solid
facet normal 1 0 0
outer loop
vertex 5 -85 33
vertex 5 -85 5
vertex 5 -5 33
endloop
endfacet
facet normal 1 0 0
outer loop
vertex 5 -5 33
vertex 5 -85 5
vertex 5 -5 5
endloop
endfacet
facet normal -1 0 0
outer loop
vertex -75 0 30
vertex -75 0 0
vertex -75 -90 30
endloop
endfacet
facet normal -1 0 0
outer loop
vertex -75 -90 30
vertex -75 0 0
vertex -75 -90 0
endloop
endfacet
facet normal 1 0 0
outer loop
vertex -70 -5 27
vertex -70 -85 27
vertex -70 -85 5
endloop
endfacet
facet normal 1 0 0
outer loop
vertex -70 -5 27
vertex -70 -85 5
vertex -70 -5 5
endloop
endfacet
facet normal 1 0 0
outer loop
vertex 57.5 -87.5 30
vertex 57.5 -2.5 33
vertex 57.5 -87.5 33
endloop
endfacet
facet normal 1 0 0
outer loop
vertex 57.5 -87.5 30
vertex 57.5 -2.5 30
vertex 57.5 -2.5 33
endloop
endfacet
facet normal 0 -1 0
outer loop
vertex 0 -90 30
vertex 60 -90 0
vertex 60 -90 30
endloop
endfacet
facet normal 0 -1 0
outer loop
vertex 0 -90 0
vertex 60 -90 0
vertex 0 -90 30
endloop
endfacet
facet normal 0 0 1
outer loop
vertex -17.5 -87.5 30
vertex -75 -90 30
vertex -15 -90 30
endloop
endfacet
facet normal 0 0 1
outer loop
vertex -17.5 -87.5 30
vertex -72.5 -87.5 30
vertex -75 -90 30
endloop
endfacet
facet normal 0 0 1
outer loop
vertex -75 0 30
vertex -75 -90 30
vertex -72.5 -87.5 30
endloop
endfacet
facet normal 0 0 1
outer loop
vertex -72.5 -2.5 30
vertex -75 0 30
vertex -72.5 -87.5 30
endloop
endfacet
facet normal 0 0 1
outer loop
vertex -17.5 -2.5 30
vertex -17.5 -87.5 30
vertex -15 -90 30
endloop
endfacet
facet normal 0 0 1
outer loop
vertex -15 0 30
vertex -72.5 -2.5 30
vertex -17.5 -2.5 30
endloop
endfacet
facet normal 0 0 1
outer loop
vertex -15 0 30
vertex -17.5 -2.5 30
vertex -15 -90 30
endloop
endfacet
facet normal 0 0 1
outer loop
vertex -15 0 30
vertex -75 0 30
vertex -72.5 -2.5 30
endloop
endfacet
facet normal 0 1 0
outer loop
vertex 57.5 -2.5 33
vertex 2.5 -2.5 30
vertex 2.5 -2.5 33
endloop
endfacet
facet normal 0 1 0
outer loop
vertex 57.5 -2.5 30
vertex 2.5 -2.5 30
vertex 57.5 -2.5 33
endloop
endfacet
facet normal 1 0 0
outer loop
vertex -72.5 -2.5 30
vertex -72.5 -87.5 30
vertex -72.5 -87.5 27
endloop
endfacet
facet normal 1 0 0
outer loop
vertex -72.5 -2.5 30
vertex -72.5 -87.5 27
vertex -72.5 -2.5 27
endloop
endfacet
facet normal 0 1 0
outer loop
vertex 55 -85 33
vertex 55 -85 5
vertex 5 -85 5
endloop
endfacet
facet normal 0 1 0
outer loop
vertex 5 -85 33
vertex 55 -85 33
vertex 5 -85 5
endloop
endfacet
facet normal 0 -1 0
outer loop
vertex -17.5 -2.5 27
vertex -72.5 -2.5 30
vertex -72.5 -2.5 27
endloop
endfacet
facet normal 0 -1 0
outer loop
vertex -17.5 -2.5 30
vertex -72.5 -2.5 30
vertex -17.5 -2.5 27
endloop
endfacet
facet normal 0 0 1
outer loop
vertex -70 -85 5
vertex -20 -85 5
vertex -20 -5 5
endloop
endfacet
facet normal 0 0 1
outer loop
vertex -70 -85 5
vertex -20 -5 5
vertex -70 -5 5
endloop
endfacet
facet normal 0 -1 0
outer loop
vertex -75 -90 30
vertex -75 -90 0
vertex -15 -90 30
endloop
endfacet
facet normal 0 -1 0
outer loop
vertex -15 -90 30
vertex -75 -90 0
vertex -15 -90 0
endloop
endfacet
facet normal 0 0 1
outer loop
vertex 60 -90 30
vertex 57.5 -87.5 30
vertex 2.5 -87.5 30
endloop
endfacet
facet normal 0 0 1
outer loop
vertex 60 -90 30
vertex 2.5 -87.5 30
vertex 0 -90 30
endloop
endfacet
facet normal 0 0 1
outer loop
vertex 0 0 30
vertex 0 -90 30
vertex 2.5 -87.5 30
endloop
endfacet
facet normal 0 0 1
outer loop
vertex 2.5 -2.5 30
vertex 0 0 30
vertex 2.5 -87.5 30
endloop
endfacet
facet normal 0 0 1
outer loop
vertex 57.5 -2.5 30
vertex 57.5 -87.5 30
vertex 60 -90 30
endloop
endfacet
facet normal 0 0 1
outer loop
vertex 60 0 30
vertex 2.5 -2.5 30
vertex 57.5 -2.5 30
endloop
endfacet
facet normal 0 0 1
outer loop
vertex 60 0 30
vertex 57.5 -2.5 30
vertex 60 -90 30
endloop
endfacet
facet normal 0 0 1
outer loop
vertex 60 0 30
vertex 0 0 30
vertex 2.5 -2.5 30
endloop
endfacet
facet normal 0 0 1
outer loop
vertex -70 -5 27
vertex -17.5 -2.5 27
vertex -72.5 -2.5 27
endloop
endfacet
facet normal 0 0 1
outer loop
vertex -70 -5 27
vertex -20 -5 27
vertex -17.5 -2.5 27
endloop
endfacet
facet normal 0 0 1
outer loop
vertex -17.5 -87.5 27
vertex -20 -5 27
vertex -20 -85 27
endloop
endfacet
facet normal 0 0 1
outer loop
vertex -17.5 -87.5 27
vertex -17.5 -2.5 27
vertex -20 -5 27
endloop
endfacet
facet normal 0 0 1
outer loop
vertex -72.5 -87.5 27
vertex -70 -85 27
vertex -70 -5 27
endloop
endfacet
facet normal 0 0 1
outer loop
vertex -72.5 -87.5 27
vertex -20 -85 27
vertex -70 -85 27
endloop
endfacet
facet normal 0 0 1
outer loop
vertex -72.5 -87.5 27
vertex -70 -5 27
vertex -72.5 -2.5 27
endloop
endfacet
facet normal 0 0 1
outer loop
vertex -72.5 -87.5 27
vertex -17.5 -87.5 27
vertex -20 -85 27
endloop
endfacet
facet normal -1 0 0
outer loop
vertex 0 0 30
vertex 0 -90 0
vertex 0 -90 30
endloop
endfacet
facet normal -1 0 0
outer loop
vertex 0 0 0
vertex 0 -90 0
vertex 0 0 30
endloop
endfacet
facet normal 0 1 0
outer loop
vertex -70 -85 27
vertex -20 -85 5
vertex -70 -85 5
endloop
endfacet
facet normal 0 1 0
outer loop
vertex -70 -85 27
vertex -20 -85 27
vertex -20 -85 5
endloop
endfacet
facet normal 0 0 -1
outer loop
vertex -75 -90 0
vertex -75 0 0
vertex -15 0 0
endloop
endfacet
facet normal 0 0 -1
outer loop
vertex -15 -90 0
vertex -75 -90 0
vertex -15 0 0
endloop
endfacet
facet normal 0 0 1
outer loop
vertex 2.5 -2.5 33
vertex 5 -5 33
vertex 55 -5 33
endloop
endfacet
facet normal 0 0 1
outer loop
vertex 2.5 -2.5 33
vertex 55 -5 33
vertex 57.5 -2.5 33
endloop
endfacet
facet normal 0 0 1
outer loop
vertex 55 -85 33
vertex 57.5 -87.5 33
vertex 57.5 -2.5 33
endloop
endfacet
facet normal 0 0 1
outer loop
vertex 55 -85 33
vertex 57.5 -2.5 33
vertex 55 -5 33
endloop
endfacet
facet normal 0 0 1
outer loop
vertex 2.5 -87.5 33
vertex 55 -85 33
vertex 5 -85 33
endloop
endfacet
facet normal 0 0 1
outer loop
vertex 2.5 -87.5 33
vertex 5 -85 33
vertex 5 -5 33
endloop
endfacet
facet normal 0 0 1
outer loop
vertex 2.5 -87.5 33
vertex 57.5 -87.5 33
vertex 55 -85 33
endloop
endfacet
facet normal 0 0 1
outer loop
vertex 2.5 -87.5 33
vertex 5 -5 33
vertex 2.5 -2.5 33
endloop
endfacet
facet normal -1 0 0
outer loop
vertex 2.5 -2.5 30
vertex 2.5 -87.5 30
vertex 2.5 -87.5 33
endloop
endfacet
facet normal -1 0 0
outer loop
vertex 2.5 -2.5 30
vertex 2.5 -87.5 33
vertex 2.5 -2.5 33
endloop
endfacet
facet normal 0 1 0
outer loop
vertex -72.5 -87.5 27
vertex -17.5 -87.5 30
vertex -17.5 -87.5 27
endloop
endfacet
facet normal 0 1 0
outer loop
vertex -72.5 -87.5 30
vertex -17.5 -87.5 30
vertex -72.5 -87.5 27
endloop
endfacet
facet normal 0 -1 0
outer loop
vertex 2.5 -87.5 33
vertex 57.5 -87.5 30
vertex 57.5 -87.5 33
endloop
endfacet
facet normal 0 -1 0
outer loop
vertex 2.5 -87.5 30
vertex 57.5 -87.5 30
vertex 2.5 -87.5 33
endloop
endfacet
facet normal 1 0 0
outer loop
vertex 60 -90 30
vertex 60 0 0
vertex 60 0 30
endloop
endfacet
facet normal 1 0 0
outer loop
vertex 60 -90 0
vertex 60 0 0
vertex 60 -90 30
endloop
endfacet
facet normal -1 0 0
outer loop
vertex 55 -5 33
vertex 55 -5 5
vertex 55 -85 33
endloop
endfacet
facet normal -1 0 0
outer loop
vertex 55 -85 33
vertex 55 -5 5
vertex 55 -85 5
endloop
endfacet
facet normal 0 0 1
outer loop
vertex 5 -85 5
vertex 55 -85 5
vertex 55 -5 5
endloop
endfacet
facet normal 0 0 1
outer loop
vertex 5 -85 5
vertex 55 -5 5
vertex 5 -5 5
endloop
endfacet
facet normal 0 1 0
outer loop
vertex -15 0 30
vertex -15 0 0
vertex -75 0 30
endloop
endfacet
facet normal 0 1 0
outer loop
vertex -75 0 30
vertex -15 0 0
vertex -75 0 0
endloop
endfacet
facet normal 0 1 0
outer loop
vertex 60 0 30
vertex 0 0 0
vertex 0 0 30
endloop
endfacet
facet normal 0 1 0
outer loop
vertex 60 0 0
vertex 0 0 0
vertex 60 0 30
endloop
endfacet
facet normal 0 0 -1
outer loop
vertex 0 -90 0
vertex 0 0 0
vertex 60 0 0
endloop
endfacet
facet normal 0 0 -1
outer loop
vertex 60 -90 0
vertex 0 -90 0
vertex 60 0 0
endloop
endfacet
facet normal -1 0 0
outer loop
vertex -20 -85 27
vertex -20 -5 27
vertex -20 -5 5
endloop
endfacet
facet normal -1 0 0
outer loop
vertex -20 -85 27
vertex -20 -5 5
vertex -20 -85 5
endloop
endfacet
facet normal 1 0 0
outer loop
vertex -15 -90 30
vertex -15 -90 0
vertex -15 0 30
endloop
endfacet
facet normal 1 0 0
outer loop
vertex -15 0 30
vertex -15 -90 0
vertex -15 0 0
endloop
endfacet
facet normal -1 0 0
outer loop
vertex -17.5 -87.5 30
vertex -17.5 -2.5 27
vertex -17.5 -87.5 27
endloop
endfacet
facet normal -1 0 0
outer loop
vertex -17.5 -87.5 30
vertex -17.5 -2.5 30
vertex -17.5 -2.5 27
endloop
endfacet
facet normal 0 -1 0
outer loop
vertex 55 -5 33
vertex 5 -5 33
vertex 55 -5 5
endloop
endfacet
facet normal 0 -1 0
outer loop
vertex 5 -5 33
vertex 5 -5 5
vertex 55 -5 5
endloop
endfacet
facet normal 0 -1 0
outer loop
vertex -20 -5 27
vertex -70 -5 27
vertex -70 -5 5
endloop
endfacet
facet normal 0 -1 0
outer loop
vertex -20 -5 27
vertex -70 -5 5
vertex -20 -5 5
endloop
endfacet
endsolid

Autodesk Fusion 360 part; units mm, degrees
sketch "草图1" plane through (0, 0, 0) normal (0, 0, 1) x (1, 0, 0)
  line L0 (0, 0) -> (60, 0)
  line L1 (60, 0) -> (60, -90)
  line L2 (60, -90) -> (0, -90)
  line L3 (0, -90) -> (0, 0)
  dimension "d1" = 60
  dimension "d2" = 90
extrude "拉伸1" add sketch "草图1" along normal blind 30 makes body 1
sketch "草图2" plane through (0, 0, 30) normal (0, 0, 1) x (-1, 0, 0)
  line L0 (0, 90) -> (-60, 90)
  line L1 (-60, 90) -> (-60, 0)
  line L2 (-60, 0) -> (0, 0)
  line L3 (0, 0) -> (0, 90)
  line L4 (-5, 5) -> (-55, 5)
  line L5 (-55, 5) -> (-55, 85)
  line L6 (-55, 85) -> (-5, 85)
  line L7 (-5, 85) -> (-5, 5)
  dimension "d5" = 50
  dimension "d6" = 80
  dimension "d7" = 55
  dimension "d8" = 5
extrude "拉伸2" cut sketch "草图2" against normal blind 25 contours L4 L5 L6 L7 bodies 1
sketch "草图3" plane through (0, -90, 0) normal (0, -1, 0) x (1, 0, 0)
  line L0 (0, 0) -> (60, 0)
  line L1 (60, 0) -> (60, 30)
  line L2 (60, 30) -> (0, 30)
  line L3 (0, 30) -> (0, 0)
sketch "草图4" plane through (0, 0, 5) normal (0, 0, 1) x (-1, 0, 0)
  line L0 (-5, 85) -> (-55, 85)
  line L1 (-55, 85) -> (-55, 5)
  line L2 (-55, 5) -> (-5, 5)
  line L3 (-5, 5) -> (-5, 85)
  circle A0 centre (-15.0278, 14.2331) radius 0.5
sketch "草图5" plane through (0, 0, 30) normal (0, 0, 1) x (-1, 0, 0)
  line L0 (-55, 5) -> (-55, 85)
  line L1 (-55, 85) -> (-5, 85)
  line L2 (-5, 85) -> (-5, 5)
  line L3 (-5, 5) -> (-55, 5)
  line L4 (0, 90) -> (-60, 90)
  line L5 (-60, 90) -> (-60, 0)
  line L6 (-60, 0) -> (0, 0)
  line L7 (0, 0) -> (0, 90)
  line L8 (-2.5, 2.5) -> (-57.5, 2.5)
  line L9 (-57.5, 2.5) -> (-57.5, 87.5)
  line L10 (-57.5, 87.5) -> (-2.5, 87.5)
  line L11 (-2.5, 87.5) -> (-2.5, 2.5)
  dimension "d12" = 55
  dimension "d13" = 85
  dimension "d14" = 2.5
  dimension "d15" = 87.5
extrude "拉伸3" add sketch "草图5" along normal blind 3 contours L8 L9 L10 L11 bodies 1
sketch "草图6" plane through (0, 0, 0) normal (0, 0, 1) x (1, 0, 0)
  line L0 (-15, 0) -> (-75, 0)
  line L1 (-75, 0) -> (-75, -90)
  line L2 (-75, -90) -> (-15, -90)
  line L3 (-15, -90) -> (-15, 0)
  dimension "d18" = 60
  dimension "d19" = 90
  dimension "d20" = 15
extrude "拉伸4" add sketch "草图6" along normal blind 30 separate body makes body 2
sketch "草图7" plane through (0, 0, 30) normal (0, 0, 1) x (-1, 0, 0)
  line L0 (15, 90) -> (15, 0)
  line L1 (15, 0) -> (75, 0)
  line L2 (75, 0) -> (75, 90)
  line L3 (75, 90) -> (15, 90)
  line L4 (20, 85) -> (70, 85)
  line L5 (70, 85) -> (70, 5)
  line L6 (70, 5) -> (20, 5)
  line L7 (20, 5) -> (20, 85)
  dimension "d23" = 50
  dimension "d24" = 80
  dimension "d25" = 5
  dimension "d26" = 5
extrude "拉伸5" cut sketch "草图7" against normal blind 25 contours L4 L5 L6 L7 bodies 2
sketch "草图8" plane through (0, 0, 30) normal (0, 0, 1) x (-1, 0, 0)
  line L0 (70, 85) -> (70, 5)
  line L1 (70, 5) -> (20, 5)
  line L2 (20, 5) -> (20, 85)
  line L3 (20, 85) -> (70, 85)
  line L4 (15, 90) -> (15, 0)
  line L5 (15, 0) -> (75, 0)
  line L6 (75, 0) -> (75, 90)
  line L7 (75, 90) -> (15, 90)
  line L8 (17.5, 87.5) -> (72.5, 87.5)
  line L9 (72.5, 87.5) -> (72.5, 2.5)
  line L10 (72.5, 2.5) -> (17.5, 2.5)
  line L11 (17.5, 2.5) -> (17.5, 87.5)
  dimension "d29" = 55
  dimension "d30" = 85
  dimension "d31" = 2.5
  dimension "d32" = 2.5
extrude "拉伸6" cut sketch "草图8" against normal blind 3 contours L8 L9 L10 L11 bodies 2
